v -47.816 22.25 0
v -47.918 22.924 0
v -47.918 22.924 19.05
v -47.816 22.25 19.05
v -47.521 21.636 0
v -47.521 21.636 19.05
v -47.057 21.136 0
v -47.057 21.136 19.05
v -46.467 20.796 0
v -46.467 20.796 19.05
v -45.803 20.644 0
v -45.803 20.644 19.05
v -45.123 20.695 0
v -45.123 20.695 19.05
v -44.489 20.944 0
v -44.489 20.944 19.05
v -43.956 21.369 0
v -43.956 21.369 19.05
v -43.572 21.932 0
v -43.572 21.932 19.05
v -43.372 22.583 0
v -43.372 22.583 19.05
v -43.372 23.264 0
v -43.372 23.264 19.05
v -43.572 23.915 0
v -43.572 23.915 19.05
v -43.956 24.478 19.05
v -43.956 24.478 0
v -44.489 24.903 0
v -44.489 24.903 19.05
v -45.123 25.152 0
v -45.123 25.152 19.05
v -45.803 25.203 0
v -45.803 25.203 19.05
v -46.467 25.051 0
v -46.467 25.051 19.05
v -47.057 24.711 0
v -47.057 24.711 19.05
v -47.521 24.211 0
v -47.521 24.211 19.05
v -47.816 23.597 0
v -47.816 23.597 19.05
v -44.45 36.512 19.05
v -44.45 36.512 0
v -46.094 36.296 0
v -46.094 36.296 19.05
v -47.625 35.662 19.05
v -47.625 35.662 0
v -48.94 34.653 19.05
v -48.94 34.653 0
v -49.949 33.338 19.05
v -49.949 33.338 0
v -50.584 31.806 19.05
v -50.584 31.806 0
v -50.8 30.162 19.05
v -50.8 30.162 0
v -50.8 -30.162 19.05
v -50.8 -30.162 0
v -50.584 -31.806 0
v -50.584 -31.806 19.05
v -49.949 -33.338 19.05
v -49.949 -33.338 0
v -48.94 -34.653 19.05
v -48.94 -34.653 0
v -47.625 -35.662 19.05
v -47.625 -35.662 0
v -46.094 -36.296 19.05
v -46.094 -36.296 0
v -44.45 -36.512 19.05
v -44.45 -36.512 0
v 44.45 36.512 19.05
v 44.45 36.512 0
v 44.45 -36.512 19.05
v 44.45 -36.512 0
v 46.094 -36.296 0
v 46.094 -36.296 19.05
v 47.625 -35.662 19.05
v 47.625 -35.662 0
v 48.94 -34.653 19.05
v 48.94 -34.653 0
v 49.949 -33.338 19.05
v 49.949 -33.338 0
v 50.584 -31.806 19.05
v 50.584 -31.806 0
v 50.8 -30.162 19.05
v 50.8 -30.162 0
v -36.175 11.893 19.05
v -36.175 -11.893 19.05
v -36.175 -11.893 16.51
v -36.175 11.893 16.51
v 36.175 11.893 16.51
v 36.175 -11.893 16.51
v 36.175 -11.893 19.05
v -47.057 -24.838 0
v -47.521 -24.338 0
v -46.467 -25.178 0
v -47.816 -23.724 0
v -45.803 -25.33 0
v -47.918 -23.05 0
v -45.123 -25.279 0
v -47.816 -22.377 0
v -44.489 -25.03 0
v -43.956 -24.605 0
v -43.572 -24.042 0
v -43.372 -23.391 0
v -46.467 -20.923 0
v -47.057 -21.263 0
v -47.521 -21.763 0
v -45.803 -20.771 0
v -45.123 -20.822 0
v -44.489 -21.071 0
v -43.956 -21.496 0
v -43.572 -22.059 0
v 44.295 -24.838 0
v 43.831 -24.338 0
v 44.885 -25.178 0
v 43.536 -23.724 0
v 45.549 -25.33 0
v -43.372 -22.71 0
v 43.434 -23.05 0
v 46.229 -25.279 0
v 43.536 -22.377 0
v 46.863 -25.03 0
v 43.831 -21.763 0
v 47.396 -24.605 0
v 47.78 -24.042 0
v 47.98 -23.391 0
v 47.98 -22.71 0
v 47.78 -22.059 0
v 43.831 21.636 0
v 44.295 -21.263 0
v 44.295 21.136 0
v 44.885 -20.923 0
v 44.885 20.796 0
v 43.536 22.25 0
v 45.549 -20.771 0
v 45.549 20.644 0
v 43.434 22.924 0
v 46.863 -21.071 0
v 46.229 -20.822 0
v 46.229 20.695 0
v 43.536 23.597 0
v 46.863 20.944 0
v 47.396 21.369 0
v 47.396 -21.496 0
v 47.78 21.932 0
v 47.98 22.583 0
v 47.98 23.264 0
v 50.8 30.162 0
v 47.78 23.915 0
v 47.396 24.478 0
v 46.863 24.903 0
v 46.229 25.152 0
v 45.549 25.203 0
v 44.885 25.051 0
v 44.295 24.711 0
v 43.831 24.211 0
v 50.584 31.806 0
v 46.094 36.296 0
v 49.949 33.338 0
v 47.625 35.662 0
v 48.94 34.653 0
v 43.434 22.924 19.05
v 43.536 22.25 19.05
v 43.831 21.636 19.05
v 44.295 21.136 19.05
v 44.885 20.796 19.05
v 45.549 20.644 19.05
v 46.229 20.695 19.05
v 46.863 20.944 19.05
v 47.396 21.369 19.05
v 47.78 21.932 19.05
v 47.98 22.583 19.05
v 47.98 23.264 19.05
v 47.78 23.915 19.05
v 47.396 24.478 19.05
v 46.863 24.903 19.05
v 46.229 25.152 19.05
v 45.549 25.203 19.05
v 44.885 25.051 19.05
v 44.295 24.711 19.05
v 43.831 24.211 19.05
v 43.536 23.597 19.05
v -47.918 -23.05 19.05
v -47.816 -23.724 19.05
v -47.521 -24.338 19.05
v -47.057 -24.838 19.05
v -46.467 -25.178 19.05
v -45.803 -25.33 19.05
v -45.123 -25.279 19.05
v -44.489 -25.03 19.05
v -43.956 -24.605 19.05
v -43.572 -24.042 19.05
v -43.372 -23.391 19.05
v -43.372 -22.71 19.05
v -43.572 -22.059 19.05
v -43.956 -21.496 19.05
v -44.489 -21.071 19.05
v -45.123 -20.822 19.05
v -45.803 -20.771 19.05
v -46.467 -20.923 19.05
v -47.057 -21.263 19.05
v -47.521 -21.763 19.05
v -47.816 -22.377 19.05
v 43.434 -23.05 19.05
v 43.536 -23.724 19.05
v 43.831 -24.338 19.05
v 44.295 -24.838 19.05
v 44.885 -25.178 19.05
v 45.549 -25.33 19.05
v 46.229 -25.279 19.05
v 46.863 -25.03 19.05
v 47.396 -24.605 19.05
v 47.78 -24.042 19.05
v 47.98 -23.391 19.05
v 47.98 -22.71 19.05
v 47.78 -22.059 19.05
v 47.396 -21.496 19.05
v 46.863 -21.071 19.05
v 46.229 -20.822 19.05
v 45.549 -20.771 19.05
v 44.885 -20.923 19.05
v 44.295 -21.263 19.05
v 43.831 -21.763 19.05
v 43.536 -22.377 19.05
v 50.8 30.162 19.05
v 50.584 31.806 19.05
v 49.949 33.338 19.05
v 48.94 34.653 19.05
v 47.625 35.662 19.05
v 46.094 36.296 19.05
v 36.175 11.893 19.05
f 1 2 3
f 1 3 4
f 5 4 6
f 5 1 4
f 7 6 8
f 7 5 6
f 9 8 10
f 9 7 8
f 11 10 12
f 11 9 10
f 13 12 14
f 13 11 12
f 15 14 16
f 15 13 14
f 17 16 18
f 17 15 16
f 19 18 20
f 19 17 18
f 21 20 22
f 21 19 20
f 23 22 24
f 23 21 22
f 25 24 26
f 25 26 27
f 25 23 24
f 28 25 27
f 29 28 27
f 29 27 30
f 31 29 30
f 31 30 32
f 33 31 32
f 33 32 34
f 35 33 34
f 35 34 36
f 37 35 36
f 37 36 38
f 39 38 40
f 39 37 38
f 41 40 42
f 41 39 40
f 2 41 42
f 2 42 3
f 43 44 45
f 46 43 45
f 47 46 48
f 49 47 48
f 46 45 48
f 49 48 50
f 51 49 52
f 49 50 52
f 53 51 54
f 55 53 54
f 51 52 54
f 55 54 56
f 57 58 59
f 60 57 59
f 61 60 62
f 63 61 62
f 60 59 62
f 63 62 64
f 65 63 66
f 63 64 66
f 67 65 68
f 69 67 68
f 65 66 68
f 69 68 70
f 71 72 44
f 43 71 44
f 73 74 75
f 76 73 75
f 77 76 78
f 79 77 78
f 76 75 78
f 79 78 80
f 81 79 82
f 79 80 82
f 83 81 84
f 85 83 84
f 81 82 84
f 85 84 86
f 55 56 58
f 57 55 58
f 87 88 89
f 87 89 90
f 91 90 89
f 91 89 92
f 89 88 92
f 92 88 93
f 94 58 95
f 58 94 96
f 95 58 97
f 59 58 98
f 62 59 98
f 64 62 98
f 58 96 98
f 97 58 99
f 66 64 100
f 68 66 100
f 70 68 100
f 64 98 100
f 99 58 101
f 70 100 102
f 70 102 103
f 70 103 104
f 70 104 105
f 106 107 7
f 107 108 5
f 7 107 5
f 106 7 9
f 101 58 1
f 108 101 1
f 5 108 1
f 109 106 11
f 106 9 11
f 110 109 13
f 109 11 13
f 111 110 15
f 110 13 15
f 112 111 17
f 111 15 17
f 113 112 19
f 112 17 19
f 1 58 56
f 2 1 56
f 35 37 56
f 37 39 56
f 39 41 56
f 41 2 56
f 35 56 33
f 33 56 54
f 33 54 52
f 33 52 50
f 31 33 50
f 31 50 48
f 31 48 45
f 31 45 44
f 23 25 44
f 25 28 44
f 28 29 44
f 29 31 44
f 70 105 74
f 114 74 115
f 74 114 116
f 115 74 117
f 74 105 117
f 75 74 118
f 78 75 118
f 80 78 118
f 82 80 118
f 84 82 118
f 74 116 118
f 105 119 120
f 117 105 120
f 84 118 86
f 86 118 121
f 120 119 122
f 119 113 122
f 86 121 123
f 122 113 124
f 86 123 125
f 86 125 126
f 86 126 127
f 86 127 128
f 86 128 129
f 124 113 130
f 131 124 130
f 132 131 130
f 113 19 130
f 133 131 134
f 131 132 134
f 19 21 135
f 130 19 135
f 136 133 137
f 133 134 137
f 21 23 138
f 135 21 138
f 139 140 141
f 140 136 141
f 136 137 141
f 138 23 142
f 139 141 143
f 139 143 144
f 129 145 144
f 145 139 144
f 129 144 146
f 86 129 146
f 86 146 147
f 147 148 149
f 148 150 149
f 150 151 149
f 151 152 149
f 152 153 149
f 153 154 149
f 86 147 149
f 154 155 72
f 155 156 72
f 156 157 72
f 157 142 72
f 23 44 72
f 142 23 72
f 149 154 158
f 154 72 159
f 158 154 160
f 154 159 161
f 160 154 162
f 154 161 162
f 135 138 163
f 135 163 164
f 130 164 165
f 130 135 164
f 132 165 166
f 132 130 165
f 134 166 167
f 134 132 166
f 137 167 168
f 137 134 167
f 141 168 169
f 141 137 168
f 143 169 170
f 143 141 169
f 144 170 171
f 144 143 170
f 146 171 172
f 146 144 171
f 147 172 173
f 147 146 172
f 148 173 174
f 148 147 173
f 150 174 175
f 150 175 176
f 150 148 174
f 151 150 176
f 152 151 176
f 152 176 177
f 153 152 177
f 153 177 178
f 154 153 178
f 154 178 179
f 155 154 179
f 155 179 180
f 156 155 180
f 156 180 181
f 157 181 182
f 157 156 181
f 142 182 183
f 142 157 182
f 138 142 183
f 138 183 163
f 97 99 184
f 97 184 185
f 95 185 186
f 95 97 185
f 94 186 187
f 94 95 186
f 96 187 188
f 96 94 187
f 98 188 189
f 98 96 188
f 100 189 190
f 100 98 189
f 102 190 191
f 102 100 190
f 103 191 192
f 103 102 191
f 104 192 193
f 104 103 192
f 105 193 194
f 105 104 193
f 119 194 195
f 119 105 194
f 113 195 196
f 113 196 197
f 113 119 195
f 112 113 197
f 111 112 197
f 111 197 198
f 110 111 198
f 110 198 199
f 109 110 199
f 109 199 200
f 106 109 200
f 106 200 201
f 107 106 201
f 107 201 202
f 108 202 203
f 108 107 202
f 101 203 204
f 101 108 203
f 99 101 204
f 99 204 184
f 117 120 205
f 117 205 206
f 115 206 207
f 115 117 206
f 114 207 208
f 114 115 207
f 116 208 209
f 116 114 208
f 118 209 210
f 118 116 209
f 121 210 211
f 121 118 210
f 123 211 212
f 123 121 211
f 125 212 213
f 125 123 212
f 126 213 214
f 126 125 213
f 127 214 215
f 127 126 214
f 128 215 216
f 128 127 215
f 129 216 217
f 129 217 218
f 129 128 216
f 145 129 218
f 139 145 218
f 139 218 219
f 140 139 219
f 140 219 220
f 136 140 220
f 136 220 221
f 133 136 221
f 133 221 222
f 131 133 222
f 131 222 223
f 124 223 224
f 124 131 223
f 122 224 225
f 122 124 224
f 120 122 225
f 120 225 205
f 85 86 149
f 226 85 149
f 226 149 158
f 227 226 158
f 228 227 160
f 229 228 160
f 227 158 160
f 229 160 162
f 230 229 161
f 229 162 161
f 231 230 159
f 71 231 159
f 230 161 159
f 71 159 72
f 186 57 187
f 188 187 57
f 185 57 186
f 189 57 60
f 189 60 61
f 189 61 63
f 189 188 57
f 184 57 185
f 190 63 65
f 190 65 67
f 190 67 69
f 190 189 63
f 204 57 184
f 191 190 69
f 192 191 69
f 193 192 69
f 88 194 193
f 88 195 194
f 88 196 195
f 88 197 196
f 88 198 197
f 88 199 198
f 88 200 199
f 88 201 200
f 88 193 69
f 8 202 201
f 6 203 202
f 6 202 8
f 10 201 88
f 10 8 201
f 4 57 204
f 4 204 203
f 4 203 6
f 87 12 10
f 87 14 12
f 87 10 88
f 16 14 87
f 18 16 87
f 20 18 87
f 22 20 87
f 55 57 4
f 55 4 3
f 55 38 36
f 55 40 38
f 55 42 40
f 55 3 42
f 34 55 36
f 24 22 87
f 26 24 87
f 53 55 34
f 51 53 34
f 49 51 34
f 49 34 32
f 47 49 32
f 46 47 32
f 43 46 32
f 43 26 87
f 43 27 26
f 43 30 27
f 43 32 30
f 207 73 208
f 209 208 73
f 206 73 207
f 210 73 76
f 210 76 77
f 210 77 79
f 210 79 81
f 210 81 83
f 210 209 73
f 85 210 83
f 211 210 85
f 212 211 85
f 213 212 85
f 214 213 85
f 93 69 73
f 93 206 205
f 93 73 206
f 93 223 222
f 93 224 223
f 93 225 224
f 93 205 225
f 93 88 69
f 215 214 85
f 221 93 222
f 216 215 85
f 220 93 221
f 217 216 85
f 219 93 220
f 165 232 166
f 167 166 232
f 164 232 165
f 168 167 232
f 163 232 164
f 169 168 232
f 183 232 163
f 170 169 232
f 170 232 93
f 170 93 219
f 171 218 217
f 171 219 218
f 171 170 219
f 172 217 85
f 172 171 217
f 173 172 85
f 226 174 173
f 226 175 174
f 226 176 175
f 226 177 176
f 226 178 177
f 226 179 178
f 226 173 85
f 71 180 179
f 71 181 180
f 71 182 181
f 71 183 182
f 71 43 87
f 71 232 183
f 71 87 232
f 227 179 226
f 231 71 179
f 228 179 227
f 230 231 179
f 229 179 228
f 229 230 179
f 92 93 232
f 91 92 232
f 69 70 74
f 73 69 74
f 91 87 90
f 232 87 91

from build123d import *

# Parameters (mm, degrees)
SKETCH1_R           = 2.286
BOSS_EXTRUDE1_DEPTH = 19.05
SKETCH2_W           = 72.350889222
SKETCH2_H           = 23.78555394
CUT_EXTRUDE1_DEPTH  = 2.54


with BuildPart() as part:
    # Sketch1 → Boss-Extrude1 (new body)
    with BuildSketch(Plane.XY):
        with BuildLine():
            Line((-44.45, -36.5125), (44.45, -36.5125))
            ThreePointArc((44.45, -36.5125), (48.940128061, -34.652628061), (50.8, -30.1625))
            Line((50.8, -30.1625), (50.8, 30.1625))
            ThreePointArc((50.8, 30.1625), (48.940128061, 34.652628061), (44.45, 36.5125))
            Line((44.45, 36.5125), (-44.45, 36.5125))
            ThreePointArc((-44.45, 36.5125), (-48.940128061, 34.652628061), (-50.8, 30.1625))
            Line((-50.8, 30.1625), (-50.8, -30.1625))
            ThreePointArc((-50.8, -30.1625), (-48.940128061, -34.652628061), (-44.45, -36.5125))
        make_face()
        with Locations(Location((-45.632054244, 22.9235, 0), (0, 0, 180))):
            Circle(SKETCH1_R, mode=Mode.SUBTRACT)
        with Locations(Location((45.72, 22.9235, 0), (0, 0, 180))):
            Circle(SKETCH1_R, mode=Mode.SUBTRACT)
        with Locations(Location((45.72, -23.0505, 0), (0, 0, 180))):
            Circle(SKETCH1_R, mode=Mode.SUBTRACT)
        with Locations(Location((-45.632054244, -23.0505, 0), (0, 0, 180))):
            Circle(SKETCH1_R, mode=Mode.SUBTRACT)
    extrude(amount=BOSS_EXTRUDE1_DEPTH)

    # Sketch2 → Cut-Extrude1 (cut)
    with BuildSketch(Plane.XY.offset(19.05)):
        Rectangle(SKETCH2_W, SKETCH2_H)
    extrude(amount=-CUT_EXTRUDE1_DEPTH, mode=Mode.SUBTRACT)


solid = part.part
